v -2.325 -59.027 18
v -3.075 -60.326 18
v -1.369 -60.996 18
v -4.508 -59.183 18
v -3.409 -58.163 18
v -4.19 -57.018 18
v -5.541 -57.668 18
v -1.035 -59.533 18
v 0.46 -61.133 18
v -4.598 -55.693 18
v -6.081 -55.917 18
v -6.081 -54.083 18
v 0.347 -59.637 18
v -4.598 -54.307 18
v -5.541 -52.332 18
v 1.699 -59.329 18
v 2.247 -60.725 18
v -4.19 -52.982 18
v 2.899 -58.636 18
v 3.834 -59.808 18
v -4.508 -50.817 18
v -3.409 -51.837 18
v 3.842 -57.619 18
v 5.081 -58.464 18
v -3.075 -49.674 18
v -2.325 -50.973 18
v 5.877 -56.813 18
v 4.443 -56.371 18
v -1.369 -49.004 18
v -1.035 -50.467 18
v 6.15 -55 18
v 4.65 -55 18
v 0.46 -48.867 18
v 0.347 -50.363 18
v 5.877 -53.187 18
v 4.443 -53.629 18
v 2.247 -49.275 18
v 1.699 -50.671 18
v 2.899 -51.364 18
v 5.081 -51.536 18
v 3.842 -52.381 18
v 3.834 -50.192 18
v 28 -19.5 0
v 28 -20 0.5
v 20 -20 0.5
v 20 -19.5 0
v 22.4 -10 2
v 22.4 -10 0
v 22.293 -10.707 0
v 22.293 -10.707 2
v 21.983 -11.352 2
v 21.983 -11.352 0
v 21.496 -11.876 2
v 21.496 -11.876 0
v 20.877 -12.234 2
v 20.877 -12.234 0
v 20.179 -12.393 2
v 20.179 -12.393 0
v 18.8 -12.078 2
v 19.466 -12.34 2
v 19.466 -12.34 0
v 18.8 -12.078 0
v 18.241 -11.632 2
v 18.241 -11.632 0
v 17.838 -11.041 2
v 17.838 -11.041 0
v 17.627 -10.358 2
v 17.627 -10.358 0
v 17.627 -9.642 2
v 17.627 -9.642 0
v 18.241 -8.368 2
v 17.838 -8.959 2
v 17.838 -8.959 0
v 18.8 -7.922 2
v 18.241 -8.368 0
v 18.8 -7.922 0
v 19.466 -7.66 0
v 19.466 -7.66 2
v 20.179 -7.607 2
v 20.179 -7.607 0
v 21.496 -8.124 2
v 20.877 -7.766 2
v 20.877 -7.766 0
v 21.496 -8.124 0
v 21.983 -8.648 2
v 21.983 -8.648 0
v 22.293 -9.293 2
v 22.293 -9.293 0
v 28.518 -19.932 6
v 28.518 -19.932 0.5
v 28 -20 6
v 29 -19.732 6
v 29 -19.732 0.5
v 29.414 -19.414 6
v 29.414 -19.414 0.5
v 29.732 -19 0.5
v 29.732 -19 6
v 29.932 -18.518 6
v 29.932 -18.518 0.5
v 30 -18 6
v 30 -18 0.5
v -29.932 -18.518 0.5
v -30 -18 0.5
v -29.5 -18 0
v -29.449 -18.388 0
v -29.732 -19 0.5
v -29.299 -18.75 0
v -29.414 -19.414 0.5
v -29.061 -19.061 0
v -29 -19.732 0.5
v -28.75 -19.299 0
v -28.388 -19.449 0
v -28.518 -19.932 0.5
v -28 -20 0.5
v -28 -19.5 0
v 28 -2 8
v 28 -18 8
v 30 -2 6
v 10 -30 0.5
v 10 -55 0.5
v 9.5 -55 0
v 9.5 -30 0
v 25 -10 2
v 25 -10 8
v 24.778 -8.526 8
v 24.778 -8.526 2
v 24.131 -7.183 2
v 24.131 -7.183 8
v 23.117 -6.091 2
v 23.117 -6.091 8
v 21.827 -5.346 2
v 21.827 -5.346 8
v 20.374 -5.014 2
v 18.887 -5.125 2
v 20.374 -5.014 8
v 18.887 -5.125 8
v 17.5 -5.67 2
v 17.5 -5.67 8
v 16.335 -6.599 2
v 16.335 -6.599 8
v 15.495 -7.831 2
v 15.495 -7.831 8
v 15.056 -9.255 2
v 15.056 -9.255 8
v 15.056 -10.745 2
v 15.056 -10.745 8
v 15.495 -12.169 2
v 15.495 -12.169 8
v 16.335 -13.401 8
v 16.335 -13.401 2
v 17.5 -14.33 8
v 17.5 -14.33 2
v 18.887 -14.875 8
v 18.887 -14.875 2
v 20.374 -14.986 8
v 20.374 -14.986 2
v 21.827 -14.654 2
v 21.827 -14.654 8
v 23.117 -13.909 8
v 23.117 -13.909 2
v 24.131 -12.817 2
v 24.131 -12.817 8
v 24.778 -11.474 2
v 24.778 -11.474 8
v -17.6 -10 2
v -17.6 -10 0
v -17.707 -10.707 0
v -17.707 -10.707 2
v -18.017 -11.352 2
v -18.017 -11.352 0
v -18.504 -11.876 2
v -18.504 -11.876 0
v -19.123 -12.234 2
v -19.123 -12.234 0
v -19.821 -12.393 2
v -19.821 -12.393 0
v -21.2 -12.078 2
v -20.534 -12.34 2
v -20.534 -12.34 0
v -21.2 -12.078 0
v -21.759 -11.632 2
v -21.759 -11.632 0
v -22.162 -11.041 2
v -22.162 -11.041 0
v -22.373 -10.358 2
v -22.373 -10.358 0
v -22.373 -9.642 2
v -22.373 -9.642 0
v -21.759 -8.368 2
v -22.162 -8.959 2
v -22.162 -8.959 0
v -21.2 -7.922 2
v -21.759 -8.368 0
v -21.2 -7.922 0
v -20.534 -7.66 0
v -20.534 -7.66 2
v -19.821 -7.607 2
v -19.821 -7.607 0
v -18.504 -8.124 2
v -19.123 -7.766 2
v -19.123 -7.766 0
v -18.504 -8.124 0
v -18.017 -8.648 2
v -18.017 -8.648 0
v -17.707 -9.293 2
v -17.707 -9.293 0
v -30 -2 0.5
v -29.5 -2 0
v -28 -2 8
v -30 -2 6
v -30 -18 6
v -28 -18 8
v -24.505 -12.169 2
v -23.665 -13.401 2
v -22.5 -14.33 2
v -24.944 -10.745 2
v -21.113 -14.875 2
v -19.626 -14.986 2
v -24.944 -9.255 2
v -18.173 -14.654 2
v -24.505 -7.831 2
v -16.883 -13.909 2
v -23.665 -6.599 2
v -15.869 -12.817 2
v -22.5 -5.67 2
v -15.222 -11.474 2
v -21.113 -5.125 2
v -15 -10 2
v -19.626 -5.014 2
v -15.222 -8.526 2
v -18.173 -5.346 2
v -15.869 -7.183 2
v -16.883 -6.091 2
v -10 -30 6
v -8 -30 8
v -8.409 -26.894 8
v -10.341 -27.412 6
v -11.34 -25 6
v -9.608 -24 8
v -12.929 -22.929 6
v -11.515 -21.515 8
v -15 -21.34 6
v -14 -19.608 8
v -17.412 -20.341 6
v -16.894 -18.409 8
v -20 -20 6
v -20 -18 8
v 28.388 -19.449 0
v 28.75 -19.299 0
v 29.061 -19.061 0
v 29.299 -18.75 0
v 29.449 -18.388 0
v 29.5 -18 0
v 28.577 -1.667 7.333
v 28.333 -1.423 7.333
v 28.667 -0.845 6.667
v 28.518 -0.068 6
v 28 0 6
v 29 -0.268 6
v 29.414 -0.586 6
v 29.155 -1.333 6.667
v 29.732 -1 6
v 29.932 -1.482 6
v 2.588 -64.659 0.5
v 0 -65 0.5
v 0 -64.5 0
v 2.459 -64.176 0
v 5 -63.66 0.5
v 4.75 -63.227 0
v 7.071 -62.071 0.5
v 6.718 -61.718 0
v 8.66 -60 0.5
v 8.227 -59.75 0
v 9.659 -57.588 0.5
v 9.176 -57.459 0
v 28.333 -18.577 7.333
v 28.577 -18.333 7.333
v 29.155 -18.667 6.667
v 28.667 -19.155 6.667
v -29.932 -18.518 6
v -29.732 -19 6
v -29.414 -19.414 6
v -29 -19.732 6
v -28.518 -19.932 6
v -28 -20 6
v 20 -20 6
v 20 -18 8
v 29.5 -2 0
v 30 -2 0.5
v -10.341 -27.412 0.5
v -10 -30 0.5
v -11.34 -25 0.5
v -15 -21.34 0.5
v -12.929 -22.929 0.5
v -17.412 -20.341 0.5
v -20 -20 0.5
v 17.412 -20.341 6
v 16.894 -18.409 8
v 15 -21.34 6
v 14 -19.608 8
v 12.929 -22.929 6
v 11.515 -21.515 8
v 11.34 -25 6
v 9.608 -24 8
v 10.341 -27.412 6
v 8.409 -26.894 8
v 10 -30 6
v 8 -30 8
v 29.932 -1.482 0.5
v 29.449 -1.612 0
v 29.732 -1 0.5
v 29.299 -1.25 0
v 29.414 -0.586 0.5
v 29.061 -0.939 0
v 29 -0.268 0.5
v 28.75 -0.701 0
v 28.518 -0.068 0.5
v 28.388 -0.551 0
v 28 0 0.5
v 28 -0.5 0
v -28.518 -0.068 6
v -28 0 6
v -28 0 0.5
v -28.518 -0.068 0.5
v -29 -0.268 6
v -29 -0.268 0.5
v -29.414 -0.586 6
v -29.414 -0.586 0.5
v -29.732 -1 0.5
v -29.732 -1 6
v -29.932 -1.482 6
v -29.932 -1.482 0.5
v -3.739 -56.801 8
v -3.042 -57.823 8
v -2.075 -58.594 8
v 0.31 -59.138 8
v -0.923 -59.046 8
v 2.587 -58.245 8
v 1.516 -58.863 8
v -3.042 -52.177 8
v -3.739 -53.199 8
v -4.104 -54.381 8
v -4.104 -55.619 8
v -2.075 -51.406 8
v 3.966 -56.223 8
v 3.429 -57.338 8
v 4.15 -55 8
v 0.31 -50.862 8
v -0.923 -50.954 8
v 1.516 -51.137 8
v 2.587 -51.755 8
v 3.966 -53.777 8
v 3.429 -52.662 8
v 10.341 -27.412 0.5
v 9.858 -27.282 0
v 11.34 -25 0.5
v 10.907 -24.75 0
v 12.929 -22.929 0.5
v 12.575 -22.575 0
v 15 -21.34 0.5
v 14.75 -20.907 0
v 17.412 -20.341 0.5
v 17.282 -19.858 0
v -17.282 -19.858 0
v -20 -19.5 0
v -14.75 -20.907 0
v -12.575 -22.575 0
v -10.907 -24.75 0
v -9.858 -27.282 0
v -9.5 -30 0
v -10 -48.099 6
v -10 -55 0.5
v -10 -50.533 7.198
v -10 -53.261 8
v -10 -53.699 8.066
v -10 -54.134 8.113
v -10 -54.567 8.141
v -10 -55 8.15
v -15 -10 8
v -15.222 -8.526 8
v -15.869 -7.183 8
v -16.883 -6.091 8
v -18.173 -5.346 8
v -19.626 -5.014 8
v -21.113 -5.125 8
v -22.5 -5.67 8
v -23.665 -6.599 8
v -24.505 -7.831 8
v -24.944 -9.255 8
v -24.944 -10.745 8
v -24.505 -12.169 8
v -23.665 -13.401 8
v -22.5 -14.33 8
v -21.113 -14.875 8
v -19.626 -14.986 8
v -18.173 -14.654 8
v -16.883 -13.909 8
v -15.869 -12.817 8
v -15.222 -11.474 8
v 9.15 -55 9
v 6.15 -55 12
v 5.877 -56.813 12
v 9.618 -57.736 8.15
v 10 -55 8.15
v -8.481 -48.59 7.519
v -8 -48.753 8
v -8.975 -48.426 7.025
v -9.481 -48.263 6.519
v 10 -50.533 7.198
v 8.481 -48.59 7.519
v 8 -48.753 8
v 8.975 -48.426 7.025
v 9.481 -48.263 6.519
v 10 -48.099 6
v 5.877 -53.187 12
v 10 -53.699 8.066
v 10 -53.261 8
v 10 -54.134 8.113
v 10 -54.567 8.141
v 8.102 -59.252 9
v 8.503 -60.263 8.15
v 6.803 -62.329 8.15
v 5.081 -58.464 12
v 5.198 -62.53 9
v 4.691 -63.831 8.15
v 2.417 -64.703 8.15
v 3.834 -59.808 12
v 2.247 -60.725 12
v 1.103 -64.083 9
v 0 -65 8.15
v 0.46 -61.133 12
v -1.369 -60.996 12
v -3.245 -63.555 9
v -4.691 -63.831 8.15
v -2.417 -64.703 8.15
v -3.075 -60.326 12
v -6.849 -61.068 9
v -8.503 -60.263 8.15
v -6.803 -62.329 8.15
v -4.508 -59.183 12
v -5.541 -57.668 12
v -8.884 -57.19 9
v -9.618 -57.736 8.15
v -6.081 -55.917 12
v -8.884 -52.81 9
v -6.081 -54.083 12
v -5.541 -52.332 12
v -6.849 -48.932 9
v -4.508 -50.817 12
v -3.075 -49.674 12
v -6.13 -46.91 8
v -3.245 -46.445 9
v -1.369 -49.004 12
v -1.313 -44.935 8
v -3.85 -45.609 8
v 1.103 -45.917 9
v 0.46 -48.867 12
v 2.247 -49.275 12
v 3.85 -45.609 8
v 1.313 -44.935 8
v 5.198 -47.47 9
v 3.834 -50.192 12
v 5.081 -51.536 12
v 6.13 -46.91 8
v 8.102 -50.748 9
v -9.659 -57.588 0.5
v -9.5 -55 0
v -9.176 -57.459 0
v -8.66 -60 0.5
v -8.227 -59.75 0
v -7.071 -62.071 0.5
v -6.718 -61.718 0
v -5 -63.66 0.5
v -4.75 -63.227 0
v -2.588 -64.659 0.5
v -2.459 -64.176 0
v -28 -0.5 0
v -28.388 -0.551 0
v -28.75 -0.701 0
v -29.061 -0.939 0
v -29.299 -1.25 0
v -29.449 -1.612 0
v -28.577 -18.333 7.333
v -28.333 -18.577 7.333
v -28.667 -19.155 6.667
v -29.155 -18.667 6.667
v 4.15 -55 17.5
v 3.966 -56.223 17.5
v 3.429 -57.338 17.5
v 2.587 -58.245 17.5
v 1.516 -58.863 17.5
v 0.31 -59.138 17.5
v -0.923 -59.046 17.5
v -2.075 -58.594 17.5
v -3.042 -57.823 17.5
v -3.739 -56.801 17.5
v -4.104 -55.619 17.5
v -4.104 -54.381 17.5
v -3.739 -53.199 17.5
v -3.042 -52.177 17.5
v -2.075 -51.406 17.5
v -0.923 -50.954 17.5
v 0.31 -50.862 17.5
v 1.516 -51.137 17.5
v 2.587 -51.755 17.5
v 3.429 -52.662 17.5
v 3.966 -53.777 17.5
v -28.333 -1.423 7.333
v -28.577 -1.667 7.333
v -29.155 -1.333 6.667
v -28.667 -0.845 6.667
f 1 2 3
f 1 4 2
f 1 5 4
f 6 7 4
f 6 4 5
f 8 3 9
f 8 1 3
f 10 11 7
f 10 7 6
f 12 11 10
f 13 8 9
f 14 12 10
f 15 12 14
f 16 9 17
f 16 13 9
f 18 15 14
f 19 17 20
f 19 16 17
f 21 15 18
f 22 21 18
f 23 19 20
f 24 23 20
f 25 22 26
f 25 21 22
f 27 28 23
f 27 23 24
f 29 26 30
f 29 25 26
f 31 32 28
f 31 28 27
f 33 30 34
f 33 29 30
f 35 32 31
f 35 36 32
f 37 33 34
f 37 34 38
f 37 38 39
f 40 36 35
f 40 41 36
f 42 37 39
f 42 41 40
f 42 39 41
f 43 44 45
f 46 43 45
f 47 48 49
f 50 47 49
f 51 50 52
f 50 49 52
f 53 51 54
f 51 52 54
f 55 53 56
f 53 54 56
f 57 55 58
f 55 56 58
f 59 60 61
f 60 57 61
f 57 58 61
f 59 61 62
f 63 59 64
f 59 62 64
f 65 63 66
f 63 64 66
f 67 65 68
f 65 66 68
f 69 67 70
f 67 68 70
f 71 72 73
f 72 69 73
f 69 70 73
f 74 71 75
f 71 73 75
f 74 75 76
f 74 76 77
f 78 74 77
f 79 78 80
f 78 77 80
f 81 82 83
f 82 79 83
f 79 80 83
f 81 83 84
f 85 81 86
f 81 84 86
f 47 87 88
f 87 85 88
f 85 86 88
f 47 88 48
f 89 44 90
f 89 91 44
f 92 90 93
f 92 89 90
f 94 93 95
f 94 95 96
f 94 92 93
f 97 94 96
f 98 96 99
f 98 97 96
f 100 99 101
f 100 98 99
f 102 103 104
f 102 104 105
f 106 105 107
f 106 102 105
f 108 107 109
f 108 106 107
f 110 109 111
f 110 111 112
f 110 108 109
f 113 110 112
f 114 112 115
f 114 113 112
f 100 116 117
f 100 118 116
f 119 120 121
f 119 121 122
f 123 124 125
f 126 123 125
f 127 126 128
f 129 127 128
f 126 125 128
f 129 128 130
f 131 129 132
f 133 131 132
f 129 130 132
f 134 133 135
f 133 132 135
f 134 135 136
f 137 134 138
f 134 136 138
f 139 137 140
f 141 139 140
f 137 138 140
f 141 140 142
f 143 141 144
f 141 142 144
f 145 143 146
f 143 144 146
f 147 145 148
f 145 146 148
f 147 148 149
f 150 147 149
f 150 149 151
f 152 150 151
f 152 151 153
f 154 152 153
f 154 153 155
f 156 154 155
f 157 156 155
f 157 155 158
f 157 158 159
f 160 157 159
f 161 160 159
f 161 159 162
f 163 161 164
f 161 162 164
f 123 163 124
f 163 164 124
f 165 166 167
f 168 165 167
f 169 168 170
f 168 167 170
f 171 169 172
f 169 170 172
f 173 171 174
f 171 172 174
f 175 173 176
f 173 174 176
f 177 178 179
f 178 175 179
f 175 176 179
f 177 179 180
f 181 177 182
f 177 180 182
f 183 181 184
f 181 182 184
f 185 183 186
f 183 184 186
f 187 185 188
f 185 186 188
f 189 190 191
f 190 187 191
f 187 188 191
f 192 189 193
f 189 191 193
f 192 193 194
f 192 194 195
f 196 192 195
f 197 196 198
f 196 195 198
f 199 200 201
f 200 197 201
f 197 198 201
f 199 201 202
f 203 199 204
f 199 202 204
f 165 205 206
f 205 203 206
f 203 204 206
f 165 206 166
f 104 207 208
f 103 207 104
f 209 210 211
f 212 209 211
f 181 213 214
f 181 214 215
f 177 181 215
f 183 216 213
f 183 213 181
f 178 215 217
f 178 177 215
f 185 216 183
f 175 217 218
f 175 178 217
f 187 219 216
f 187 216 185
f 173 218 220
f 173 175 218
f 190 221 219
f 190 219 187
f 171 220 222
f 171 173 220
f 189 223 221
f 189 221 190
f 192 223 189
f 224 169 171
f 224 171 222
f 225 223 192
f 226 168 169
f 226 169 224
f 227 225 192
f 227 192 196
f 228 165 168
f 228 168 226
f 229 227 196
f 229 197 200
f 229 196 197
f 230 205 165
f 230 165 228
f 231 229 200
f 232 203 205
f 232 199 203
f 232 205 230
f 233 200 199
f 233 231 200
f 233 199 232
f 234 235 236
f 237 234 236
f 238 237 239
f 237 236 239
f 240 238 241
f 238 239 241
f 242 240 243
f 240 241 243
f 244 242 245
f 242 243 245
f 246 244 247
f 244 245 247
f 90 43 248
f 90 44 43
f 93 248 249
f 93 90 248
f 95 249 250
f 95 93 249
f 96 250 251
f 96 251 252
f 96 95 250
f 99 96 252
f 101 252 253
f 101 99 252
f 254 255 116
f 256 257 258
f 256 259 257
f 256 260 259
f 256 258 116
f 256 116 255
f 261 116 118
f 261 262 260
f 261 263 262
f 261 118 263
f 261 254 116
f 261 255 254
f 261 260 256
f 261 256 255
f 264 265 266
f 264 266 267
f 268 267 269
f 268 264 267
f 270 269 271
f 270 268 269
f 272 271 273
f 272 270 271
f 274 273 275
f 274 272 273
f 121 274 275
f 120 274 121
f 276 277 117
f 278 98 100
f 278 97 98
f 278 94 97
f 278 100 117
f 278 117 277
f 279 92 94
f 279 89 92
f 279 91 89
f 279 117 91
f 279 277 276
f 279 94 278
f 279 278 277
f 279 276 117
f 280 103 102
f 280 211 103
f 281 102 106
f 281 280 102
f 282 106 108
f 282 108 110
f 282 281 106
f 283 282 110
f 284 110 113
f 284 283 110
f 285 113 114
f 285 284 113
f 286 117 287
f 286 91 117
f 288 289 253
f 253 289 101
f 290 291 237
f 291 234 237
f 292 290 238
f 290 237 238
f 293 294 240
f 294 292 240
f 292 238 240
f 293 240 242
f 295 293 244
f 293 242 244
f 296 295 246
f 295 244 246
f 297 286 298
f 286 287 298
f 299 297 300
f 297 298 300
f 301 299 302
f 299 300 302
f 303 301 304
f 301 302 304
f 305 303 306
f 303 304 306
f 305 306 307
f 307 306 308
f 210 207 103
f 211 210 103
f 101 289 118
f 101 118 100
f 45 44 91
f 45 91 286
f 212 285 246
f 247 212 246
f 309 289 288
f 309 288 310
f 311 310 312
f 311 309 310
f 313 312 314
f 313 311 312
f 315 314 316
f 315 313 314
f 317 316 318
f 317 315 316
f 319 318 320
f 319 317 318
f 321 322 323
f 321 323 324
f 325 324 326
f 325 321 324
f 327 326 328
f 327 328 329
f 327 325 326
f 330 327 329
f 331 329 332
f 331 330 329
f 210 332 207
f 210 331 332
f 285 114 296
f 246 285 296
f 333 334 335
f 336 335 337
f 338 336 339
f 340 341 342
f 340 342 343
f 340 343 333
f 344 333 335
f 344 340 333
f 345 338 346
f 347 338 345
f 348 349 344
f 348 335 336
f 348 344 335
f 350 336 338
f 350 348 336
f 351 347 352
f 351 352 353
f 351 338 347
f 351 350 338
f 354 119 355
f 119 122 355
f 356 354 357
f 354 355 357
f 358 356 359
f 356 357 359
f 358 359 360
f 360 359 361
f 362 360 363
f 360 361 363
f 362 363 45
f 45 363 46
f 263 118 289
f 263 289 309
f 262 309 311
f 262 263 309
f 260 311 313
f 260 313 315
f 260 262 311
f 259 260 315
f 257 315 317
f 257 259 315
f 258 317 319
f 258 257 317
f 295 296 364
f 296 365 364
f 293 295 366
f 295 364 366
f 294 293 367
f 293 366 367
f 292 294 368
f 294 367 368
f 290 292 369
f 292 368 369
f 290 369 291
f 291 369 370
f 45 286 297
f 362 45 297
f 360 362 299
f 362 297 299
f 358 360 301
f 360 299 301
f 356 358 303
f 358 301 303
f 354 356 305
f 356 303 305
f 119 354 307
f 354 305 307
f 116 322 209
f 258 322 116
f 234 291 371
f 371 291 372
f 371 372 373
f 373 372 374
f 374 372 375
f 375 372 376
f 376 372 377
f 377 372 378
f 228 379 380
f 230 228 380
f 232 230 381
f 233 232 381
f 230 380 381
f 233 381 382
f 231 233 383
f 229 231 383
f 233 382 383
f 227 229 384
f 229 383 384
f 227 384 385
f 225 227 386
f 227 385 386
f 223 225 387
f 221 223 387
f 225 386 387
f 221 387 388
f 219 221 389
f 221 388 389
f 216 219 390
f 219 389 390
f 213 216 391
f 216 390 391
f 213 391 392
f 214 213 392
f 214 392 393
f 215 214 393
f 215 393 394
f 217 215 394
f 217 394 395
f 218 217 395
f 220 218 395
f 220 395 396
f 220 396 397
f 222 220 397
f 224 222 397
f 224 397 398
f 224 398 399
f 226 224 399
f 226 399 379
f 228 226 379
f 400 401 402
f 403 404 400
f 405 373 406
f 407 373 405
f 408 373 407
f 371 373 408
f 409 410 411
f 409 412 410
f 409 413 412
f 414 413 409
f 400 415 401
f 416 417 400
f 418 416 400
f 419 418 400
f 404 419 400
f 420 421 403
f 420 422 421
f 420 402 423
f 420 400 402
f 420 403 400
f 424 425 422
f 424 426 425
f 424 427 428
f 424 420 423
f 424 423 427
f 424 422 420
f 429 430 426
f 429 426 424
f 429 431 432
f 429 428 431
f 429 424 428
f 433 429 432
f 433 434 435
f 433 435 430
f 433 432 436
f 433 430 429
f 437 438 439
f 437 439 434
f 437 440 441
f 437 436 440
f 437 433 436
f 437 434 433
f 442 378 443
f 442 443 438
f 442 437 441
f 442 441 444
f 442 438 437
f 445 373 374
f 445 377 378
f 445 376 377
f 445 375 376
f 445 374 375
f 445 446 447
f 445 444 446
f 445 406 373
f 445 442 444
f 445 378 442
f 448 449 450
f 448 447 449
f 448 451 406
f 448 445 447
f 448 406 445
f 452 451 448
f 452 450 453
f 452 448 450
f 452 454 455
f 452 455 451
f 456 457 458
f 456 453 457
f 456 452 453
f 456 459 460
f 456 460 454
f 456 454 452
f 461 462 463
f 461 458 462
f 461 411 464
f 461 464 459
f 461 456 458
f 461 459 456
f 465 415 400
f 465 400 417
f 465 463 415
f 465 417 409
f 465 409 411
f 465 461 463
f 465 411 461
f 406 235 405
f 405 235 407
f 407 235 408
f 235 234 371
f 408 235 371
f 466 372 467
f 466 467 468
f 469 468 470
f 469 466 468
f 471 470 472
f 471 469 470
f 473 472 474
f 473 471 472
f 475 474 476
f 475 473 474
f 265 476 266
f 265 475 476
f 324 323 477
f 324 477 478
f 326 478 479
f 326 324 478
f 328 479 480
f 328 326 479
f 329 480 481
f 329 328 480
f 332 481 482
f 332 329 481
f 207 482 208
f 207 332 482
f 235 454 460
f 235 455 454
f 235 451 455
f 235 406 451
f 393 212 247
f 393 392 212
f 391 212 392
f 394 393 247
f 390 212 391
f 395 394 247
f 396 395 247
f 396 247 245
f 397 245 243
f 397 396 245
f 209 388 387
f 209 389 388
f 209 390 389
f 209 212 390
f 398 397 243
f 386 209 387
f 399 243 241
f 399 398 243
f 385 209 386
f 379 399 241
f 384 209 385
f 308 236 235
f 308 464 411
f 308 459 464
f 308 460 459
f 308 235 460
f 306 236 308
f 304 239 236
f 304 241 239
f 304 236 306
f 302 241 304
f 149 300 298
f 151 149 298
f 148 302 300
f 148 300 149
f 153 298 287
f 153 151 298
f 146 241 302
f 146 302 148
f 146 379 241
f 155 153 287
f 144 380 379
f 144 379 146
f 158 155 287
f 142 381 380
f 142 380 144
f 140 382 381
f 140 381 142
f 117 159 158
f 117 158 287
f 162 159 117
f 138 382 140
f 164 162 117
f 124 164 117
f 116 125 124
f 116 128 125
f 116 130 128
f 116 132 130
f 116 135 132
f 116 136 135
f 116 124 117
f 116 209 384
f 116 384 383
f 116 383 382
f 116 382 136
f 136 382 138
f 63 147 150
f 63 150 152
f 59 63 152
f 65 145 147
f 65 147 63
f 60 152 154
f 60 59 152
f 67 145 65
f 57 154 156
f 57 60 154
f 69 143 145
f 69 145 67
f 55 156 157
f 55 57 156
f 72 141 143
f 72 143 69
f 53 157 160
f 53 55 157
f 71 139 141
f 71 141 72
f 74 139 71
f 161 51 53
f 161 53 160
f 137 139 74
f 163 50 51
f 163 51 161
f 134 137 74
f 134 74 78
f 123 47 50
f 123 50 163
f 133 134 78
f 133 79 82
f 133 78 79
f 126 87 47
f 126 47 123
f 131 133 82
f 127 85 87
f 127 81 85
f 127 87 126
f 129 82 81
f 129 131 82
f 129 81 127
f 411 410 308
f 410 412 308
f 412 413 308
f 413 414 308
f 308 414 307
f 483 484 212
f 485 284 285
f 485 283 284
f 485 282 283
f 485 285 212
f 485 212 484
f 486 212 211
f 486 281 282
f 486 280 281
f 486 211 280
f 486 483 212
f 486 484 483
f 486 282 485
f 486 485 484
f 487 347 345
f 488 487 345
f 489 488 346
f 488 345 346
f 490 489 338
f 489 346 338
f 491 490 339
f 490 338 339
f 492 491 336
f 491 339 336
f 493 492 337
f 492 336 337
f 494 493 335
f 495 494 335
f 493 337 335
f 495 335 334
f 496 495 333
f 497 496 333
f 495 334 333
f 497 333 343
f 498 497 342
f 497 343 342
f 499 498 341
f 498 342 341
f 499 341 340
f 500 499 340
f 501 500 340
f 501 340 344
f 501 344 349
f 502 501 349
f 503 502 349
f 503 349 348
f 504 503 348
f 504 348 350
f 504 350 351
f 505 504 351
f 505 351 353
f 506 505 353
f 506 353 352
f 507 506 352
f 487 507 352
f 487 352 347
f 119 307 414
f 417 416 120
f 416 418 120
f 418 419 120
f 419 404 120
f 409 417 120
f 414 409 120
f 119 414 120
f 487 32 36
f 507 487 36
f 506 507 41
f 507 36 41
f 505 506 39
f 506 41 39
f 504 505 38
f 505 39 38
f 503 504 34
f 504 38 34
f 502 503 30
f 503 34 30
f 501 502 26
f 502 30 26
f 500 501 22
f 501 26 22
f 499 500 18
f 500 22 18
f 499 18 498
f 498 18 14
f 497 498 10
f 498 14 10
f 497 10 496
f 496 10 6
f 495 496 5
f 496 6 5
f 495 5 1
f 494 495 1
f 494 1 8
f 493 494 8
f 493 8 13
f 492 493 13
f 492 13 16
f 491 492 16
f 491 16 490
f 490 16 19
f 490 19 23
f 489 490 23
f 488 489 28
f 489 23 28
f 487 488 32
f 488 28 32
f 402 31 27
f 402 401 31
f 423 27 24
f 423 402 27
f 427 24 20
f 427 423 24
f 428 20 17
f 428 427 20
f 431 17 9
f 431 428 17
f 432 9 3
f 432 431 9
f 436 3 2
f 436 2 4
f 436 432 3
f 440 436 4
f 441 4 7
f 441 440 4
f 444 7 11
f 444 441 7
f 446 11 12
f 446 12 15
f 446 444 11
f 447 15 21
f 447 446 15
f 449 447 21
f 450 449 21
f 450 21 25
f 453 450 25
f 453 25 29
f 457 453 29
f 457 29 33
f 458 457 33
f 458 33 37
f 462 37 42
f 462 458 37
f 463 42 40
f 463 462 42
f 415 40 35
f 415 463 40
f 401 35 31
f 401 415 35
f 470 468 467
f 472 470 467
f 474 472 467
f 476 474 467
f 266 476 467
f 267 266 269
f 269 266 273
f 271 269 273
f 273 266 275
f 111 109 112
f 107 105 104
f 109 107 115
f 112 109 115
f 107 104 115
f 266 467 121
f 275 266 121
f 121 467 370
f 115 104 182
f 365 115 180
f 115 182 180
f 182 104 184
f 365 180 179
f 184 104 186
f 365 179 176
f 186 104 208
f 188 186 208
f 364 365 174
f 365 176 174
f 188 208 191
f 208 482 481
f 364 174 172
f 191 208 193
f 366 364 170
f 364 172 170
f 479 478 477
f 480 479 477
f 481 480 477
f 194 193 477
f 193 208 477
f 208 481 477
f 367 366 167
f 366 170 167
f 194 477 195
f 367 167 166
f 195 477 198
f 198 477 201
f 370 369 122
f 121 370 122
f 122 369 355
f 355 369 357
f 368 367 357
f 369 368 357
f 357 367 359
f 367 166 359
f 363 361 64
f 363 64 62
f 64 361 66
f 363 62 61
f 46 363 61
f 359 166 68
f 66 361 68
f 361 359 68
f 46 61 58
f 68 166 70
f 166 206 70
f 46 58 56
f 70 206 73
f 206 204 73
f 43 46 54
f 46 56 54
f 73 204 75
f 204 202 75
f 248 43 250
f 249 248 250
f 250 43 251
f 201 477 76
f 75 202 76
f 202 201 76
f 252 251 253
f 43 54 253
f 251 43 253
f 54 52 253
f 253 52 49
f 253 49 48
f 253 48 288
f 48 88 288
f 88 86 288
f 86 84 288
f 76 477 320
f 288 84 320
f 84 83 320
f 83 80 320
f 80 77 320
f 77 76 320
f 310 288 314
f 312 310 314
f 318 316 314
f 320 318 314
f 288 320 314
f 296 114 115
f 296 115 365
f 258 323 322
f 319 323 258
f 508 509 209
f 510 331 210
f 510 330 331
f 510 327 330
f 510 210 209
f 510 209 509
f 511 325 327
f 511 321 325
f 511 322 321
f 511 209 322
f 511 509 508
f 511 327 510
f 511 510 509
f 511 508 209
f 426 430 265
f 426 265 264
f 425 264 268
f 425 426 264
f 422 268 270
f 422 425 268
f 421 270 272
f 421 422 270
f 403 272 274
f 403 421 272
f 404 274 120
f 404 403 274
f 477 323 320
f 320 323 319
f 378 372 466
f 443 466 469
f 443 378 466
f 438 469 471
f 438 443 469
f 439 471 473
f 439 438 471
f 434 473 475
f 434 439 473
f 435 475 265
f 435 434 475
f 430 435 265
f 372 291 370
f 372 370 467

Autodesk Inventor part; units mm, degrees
ref_plane "YZ Plane" through (0, 0, 0) normal (1, 0, 0) x (0, 1, 0)
ref_plane "XZ Plane" through (0, 0, 0) normal (0, 1, 0) x (-1, 0, 0)
ref_plane "XY Plane" through (0, 0, 0) normal (0, 0, 1) x (1, 0, 0)
sketch "Sketch1" plane through (0, 0, 0) normal (0, 0, 1) x (1, 0, 0)
  line L0 (-42, 0) -> (42, 0) projected
  line L1 (-30, 0) -> (-30, -20)
  line L2 (-30, -20) -> (-10, -20)
  line L3 (-10, -20) -> (-10, -65)
  line L4 (-10, -65) -> (0, -65)
  line L5 (0, -78) -> (0, 13) projected
  line L6 (-30, 0) -> (0, 0)
  line L7 (30, 0) -> (30, -20)
  line L8 (30, -20) -> (10, -20)
  line L9 (10, -20) -> (10, -65)
  line L10 (10, -65) -> (0, -65)
  line L11 (30, 0) -> (0, 0)
  line L12 (-30, -10) -> (30, -10) construction
  circle A0 centre (-20, -10) radius 2.4
  circle A1 centre (20, -10) radius 2.4
  dimension "d0" = 10
  dimension "d1" = 20
  dimension "d2" = 65
  dimension "d3" = 30
  dimension "d4" = 10
  dimension "d5" = 4.8
  dimension "d6" = 4.8
  dimension "d7" = 10
  dimension "d8" = 10
extrude "Extrusion1" add sketch "Sketch1" along normal blind 8
sketch "Sketch2" plane through (0, 0, 8) normal (0, 0, 1) x (1, 0, 0)
  circle A0 centre (-20, -10) radius 2.4 projected
  circle A1 centre (20, -10) radius 2.4 projected
  circle A2 centre (-20, -10) radius 5
  circle A3 centre (20, -10) radius 5
  point P0 (0, 0)
  dimension "d11" = 10
  dimension "d12" = 10
extrude "Extrusion2" cut sketch "Sketch2" against normal blind 6
sketch "Sketch3" plane through (0, 0, 8) normal (0, 0, 1) x (1, 0, 0)
  line L0 (0, -78) -> (0, 13) projected
  circle A0 centre (0, -55) radius 4.15
  circle A1 centre (-20, -10) radius 2.4 projected
  circle A2 centre (0, -55) radius 6.15
  point P0 (0, 0)
  dimension "d15" = 45
  dimension "d16" = 8.3
  dimension "d17" = 2
extrude "Extrusion3" add sketch "Sketch3" along normal blind 10 contours A2 L0 A0 | L0 A0 A2
chamfer "Chamfer1" distance 0.5 angle 45 1 edges at (-4.15, -55, 18)
chamfer "Chamfer2" distance 4 angle 45 1 edges at (-6.15, -55, 8)
fillet "Fillet1" radius 10 4 edges at (10, -65, 4) (-10, -65, 4) (-10, -20, 4) (10, -20, 4)
fillet "Fillet2" radius 2 4 edges at (30, -20, 4) (30, 0, 4) (-30, 0, 4) (-30, -20, 4)
chamfer "Chamfer3" distance 0.5 angle 45 9 edges at (-7.0711, -62.0711, 0) (-10, -42.5, 0) (7.0711, -62.0711, 0) (10, -42.5, 0) (23.9999, -20, 0) (-23.9999, -20, 0) (-30, -10, 0) (0, 0, 0) (30, -10, 0)
chamfer "Chamfer4" distance 2 angle 45 9 edges at (-12.9289, -22.9289, 8) (-23.9999, -20, 8) (-10, -41.6307, 8) (-30, -10, 8) (0, 0, 8) (10, -41.6307, 8) (12.9289, -22.9289, 8) (23.9999, -20, 8) (30, -10, 8)
equation "\"d4\" = 0.5 * d1"
equation "\"d8\" = d7"
equation "\"d12\" = d11"
properties part number "RodHolder_2"
